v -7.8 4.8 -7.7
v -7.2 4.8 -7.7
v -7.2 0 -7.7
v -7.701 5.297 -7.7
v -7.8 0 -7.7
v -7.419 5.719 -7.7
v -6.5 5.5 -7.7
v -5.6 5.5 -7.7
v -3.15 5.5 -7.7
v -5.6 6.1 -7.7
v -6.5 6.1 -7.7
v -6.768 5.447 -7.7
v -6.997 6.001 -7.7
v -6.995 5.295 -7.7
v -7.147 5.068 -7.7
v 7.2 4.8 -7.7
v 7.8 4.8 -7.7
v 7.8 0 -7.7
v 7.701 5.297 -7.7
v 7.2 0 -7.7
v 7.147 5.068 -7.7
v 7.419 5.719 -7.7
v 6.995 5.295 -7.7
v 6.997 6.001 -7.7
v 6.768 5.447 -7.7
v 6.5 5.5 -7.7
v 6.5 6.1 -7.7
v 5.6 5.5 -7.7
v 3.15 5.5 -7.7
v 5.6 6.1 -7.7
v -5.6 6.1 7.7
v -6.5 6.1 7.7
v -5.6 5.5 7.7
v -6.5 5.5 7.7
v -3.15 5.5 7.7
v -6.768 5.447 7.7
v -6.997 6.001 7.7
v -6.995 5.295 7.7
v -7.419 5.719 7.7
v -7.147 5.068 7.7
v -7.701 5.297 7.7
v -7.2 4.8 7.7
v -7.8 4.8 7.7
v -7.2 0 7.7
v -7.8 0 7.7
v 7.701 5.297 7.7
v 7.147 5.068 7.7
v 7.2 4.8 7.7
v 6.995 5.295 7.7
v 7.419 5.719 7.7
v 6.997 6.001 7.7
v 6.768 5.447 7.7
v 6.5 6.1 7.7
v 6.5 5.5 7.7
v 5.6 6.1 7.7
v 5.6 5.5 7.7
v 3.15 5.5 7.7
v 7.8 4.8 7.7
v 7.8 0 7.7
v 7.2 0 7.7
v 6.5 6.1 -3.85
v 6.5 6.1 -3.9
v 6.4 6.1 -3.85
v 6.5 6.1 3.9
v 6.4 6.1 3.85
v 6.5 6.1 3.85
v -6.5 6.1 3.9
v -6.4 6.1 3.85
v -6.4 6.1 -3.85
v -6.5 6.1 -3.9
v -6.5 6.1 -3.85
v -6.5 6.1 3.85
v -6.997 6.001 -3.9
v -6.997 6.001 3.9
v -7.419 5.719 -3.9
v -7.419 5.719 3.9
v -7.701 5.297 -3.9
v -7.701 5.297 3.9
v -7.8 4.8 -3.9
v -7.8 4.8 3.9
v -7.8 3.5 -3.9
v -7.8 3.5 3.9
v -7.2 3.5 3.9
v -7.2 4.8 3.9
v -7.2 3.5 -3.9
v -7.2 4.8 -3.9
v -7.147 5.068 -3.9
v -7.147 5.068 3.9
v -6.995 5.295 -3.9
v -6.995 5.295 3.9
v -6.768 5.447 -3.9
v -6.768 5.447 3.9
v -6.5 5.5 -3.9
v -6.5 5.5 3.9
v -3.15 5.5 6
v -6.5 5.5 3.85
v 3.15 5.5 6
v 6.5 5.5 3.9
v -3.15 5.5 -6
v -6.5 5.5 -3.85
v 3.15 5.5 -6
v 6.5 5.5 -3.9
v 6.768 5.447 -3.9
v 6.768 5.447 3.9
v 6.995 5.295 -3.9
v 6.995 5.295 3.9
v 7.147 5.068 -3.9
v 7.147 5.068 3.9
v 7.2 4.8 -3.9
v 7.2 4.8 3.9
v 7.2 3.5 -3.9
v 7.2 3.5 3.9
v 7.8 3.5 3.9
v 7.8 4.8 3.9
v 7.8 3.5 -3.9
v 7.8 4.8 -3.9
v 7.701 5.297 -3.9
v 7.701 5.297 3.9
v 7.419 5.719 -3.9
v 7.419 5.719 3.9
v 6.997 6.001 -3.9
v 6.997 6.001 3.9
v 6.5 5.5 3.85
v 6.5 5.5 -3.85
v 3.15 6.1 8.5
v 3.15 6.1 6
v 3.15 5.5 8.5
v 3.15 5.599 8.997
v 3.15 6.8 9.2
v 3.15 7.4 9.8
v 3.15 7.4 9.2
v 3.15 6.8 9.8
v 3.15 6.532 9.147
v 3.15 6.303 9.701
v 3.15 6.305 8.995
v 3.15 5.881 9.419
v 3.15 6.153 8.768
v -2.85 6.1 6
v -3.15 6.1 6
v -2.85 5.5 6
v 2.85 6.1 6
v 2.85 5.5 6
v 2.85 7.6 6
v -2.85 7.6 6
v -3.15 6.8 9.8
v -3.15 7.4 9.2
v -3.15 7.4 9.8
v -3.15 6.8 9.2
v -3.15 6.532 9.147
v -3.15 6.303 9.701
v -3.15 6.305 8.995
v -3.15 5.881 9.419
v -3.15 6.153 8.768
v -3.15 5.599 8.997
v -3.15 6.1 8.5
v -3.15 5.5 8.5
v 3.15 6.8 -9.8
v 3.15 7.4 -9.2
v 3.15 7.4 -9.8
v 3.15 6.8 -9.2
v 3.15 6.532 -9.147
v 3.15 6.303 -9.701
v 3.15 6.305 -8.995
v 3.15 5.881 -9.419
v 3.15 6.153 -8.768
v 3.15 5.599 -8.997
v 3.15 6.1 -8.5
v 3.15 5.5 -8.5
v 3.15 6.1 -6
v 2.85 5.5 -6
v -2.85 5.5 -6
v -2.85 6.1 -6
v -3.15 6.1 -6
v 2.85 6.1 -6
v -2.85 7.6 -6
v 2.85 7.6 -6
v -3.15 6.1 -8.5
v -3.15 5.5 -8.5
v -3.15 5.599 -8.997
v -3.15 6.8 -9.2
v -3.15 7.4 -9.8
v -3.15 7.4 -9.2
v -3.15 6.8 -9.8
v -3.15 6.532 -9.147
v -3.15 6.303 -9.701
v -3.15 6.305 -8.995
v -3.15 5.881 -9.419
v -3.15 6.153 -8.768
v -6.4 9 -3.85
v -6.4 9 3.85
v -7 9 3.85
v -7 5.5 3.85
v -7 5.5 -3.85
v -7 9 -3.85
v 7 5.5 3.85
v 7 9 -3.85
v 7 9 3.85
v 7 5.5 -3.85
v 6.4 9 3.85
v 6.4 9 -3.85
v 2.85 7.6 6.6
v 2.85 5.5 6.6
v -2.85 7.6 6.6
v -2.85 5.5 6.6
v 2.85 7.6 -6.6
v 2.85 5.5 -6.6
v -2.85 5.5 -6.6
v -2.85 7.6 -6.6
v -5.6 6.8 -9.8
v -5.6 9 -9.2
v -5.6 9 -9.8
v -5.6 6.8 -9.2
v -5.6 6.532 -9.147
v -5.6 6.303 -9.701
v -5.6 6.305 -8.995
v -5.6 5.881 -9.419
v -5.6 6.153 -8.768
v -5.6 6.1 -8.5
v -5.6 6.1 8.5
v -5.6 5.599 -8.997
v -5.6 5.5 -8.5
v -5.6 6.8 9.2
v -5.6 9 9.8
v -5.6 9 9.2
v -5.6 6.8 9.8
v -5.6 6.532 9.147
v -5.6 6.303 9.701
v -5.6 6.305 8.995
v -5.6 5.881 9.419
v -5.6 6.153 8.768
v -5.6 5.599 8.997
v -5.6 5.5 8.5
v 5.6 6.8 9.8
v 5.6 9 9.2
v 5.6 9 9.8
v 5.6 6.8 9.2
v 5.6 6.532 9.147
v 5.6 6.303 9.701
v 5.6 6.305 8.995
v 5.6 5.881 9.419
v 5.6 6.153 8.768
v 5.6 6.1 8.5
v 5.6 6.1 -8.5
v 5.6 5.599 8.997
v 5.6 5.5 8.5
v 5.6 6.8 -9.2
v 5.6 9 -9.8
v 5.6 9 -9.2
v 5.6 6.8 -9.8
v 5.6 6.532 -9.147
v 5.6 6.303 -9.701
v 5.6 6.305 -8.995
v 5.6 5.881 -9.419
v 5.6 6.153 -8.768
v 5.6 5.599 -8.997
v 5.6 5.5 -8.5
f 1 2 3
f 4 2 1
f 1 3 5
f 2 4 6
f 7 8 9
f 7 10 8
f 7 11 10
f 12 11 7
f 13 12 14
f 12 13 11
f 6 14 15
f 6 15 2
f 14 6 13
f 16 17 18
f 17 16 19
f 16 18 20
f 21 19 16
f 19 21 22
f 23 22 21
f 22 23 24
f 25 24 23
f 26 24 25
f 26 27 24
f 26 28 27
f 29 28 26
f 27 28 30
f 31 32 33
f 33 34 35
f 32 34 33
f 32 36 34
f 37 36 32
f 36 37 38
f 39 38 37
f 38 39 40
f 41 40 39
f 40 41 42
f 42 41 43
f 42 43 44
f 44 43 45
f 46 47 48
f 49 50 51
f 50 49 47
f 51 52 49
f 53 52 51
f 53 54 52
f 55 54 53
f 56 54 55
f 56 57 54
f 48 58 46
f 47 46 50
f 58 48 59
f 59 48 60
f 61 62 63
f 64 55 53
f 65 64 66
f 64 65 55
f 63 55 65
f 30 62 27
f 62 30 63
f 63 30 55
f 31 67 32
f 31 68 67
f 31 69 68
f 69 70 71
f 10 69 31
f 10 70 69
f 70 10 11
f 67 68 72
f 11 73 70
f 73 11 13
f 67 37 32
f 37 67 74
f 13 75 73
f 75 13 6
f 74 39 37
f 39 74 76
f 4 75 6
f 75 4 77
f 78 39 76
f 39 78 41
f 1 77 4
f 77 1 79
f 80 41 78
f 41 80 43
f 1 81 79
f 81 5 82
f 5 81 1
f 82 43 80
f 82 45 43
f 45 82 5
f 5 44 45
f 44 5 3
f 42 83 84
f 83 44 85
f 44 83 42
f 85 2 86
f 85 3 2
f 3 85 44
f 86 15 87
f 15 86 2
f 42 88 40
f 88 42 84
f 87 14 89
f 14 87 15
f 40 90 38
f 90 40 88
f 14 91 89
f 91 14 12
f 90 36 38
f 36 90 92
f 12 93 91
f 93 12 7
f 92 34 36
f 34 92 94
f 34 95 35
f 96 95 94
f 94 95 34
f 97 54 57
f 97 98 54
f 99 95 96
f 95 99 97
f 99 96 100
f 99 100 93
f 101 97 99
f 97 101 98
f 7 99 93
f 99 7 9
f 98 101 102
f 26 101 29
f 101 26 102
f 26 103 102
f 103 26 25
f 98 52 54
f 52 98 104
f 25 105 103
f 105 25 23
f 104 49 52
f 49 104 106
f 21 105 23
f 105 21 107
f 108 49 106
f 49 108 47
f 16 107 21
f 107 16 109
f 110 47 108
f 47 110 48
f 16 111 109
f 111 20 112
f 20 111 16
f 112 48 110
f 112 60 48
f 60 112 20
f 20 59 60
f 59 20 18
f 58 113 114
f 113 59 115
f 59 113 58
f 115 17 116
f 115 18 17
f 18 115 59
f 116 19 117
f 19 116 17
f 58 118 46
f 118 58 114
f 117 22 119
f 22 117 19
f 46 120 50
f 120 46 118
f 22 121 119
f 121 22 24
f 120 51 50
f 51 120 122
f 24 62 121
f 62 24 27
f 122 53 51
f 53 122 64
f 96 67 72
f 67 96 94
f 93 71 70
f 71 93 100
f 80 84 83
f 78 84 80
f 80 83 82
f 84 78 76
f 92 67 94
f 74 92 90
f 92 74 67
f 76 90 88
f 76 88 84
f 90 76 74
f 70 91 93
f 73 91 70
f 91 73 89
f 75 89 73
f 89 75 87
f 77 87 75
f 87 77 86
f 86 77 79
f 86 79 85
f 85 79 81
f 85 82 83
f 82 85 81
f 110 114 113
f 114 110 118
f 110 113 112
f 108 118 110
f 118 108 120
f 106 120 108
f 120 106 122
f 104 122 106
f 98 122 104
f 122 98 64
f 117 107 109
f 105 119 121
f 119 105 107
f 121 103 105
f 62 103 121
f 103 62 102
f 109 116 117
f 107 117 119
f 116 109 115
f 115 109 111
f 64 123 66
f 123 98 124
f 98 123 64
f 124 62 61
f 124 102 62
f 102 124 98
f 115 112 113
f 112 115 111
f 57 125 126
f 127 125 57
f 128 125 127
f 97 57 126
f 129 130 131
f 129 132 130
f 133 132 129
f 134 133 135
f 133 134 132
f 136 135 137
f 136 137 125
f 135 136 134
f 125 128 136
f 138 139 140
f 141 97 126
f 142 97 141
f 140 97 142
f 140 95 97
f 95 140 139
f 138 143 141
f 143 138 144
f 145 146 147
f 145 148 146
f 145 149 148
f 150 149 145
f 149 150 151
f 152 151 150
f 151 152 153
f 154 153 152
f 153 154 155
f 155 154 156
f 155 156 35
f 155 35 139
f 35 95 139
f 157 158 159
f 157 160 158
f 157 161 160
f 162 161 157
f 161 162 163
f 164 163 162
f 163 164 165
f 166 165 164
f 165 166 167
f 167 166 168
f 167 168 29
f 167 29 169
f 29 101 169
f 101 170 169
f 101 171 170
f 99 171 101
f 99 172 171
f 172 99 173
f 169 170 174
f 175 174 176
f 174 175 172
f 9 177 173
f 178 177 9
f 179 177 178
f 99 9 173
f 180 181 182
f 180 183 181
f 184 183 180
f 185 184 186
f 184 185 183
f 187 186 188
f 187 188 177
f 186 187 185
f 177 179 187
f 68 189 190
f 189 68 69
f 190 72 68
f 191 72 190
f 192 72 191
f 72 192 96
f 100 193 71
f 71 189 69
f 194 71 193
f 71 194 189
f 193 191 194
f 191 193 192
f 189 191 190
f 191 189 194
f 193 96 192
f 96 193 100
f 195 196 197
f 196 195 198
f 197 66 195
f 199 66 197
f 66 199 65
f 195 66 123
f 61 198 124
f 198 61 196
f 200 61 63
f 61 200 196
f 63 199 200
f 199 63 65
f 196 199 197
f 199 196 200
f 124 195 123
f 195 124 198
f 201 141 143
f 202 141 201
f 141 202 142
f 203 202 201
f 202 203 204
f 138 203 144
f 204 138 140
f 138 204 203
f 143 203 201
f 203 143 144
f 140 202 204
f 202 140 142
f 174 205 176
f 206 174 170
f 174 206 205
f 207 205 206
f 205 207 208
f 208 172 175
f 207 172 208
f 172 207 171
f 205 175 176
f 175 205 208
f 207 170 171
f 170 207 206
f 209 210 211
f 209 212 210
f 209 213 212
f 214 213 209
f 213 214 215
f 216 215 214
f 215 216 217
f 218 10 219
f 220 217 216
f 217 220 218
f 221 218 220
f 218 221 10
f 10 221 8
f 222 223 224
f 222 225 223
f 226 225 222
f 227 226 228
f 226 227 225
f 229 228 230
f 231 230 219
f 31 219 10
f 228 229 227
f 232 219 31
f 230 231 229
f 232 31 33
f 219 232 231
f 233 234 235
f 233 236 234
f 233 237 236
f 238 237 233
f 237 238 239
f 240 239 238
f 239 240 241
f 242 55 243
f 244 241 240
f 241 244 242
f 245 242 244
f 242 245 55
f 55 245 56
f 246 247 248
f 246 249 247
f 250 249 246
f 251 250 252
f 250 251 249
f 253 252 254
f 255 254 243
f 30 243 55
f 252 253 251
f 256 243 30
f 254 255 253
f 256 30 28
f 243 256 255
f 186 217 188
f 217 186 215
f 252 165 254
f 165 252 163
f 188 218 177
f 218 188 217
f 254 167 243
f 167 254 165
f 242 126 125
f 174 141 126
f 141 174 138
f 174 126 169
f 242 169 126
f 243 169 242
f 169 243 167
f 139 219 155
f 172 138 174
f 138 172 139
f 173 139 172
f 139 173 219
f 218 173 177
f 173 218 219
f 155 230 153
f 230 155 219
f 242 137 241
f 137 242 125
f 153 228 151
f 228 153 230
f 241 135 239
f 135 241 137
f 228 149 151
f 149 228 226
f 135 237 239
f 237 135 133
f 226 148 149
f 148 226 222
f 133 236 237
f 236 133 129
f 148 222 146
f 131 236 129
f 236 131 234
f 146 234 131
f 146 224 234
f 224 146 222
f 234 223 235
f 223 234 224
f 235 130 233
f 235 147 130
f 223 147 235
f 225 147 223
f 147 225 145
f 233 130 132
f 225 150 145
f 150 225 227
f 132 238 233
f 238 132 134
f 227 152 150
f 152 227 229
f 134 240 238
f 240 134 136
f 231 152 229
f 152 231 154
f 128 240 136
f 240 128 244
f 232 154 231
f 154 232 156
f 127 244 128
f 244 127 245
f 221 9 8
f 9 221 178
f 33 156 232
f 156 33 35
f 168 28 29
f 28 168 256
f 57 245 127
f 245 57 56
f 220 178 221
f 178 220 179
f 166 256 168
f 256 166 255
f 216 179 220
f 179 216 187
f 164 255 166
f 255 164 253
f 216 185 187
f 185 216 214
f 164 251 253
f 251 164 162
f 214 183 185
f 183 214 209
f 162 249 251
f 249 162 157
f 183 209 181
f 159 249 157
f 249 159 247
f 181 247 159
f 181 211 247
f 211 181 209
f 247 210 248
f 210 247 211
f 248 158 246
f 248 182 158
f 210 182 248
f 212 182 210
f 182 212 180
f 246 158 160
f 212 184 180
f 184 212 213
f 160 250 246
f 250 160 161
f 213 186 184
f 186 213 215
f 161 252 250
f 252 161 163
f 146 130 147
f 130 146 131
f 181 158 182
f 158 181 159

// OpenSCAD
thickness = 0.6;
radius = 1;
main_length = 15.4;
main_height = 6.1 - thickness/2;

$fn = 16;

color("#aaa") {

difference() {
    width = 15;
    cutout_length = 7.8;
    cutout_depth = main_height - 3.5;
    inner_length = 12;
    inner_width = 6.3;
    
    union() linear_extrude(height = main_length, center = true, convexity = 3) {
        translate([-width/2, (main_height-radius)/2, 0]) square([thickness, main_height - radius], center = true);
        translate([width/2, (main_height-radius)/2, 0]) square([thickness, main_height - radius], center = true);
        translate([0, main_height, 0]) square([width - 2*radius, thickness], center = true);
        
        translate([-width/2 + radius, main_height-radius, 0]) difference() {
            circle(radius + thickness/2);
            circle(radius - thickness/2);
            translate([radius, 0, 0]) square([radius*2, radius*3], center = true);
            translate([0, -radius, 0]) square([radius*3, radius*2], center = true);
        }
        
        translate([width/2 - radius, main_height-radius, 0]) difference() {
            circle(radius + thickness/2);
            circle(radius - thickness/2);
            translate([-radius, 0, 0]) square([radius*2, radius*3], center = true);
            translate([0, -radius, 0]) square([radius*3, radius*2], center = true);
        }
    }
    
    translate([-width/2, main_height, 0]) cube([radius * 2, cutout_depth*2, cutout_length], center = true);
    translate([width/2, main_height, 0]) cube([radius * 2, cutout_depth*2, cutout_length], center = true);
    translate([0, main_height, main_length/2]) cube([inner_width, thickness+1, main_length - inner_length], center = true);
    translate([0, main_height, -main_length/2]) cube([inner_width, thickness+1, main_length - inner_length], center = true);
}


// inner sides
union() {
    height = 9 - main_height;
    length = 7.7;
    translate([-7 + thickness/2, main_height + height/2 - thickness/4, 0]) cube([thickness, height + thickness/2, length], center = true);
    translate([7 - thickness/2, main_height + height/2 - thickness/4, 0]) cube([thickness, height + thickness/2, length], center = true);
}

// inner top/bottom
union() {
    width = 5.7;
    height = 7.6 - main_height;
    translate([0, main_height + height/2 - thickness/4, 6 + thickness/2]) cube([width, height + thickness/2, thickness], center = true);
    translate([0, main_height + height/2 - thickness/4, -6 - thickness/2]) cube([width, height + thickness/2, thickness], center = true);
}

// outer top/bottom
rotate([0, 90, 0])
difference() {
    length = 19;
    width = 11.2;
    height = 9;
    
    cutout_width = 6.3;
    cutout_height = (height - 1.6) - main_height;

    union() linear_extrude(height = width, center = true, convexity = 3) {
    
        translate([-length/2, height - (height-main_height-radius)/2, 0]) square([thickness, height - main_height - radius], center = true);
        translate([length/2, height - (height-main_height-radius)/2, 0]) square([thickness, height - main_height - radius], center = true);
        translate([0, main_height, 0]) square([length - 2*radius, thickness], center = true);
        
        translate([-length/2 + radius, main_height+radius, 0]) difference() {
            circle(radius + thickness/2);
            circle(radius - thickness/2);
            translate([radius, 0, 0]) square([radius*2, radius*3], center = true);
            translate([0, radius, 0]) square([radius*3, radius*2], center = true);
        }
        
        translate([length/2 - radius, main_height+radius, 0]) difference() {
            circle(radius + thickness/2);
            circle(radius - thickness/2);
            translate([-radius, 0, 0]) square([radius*2, radius*3], center = true);
            translate([0, radius, 0]) square([radius*3, radius*2], center = true);
        }
    
    }
    
    translate([-length/2, main_height, 0]) cube([length-12, cutout_height*2, cutout_width], center = true);
    translate([length/2, main_height, 0]) cube([length-12, cutout_height*2, cutout_width], center = true);
}
}
